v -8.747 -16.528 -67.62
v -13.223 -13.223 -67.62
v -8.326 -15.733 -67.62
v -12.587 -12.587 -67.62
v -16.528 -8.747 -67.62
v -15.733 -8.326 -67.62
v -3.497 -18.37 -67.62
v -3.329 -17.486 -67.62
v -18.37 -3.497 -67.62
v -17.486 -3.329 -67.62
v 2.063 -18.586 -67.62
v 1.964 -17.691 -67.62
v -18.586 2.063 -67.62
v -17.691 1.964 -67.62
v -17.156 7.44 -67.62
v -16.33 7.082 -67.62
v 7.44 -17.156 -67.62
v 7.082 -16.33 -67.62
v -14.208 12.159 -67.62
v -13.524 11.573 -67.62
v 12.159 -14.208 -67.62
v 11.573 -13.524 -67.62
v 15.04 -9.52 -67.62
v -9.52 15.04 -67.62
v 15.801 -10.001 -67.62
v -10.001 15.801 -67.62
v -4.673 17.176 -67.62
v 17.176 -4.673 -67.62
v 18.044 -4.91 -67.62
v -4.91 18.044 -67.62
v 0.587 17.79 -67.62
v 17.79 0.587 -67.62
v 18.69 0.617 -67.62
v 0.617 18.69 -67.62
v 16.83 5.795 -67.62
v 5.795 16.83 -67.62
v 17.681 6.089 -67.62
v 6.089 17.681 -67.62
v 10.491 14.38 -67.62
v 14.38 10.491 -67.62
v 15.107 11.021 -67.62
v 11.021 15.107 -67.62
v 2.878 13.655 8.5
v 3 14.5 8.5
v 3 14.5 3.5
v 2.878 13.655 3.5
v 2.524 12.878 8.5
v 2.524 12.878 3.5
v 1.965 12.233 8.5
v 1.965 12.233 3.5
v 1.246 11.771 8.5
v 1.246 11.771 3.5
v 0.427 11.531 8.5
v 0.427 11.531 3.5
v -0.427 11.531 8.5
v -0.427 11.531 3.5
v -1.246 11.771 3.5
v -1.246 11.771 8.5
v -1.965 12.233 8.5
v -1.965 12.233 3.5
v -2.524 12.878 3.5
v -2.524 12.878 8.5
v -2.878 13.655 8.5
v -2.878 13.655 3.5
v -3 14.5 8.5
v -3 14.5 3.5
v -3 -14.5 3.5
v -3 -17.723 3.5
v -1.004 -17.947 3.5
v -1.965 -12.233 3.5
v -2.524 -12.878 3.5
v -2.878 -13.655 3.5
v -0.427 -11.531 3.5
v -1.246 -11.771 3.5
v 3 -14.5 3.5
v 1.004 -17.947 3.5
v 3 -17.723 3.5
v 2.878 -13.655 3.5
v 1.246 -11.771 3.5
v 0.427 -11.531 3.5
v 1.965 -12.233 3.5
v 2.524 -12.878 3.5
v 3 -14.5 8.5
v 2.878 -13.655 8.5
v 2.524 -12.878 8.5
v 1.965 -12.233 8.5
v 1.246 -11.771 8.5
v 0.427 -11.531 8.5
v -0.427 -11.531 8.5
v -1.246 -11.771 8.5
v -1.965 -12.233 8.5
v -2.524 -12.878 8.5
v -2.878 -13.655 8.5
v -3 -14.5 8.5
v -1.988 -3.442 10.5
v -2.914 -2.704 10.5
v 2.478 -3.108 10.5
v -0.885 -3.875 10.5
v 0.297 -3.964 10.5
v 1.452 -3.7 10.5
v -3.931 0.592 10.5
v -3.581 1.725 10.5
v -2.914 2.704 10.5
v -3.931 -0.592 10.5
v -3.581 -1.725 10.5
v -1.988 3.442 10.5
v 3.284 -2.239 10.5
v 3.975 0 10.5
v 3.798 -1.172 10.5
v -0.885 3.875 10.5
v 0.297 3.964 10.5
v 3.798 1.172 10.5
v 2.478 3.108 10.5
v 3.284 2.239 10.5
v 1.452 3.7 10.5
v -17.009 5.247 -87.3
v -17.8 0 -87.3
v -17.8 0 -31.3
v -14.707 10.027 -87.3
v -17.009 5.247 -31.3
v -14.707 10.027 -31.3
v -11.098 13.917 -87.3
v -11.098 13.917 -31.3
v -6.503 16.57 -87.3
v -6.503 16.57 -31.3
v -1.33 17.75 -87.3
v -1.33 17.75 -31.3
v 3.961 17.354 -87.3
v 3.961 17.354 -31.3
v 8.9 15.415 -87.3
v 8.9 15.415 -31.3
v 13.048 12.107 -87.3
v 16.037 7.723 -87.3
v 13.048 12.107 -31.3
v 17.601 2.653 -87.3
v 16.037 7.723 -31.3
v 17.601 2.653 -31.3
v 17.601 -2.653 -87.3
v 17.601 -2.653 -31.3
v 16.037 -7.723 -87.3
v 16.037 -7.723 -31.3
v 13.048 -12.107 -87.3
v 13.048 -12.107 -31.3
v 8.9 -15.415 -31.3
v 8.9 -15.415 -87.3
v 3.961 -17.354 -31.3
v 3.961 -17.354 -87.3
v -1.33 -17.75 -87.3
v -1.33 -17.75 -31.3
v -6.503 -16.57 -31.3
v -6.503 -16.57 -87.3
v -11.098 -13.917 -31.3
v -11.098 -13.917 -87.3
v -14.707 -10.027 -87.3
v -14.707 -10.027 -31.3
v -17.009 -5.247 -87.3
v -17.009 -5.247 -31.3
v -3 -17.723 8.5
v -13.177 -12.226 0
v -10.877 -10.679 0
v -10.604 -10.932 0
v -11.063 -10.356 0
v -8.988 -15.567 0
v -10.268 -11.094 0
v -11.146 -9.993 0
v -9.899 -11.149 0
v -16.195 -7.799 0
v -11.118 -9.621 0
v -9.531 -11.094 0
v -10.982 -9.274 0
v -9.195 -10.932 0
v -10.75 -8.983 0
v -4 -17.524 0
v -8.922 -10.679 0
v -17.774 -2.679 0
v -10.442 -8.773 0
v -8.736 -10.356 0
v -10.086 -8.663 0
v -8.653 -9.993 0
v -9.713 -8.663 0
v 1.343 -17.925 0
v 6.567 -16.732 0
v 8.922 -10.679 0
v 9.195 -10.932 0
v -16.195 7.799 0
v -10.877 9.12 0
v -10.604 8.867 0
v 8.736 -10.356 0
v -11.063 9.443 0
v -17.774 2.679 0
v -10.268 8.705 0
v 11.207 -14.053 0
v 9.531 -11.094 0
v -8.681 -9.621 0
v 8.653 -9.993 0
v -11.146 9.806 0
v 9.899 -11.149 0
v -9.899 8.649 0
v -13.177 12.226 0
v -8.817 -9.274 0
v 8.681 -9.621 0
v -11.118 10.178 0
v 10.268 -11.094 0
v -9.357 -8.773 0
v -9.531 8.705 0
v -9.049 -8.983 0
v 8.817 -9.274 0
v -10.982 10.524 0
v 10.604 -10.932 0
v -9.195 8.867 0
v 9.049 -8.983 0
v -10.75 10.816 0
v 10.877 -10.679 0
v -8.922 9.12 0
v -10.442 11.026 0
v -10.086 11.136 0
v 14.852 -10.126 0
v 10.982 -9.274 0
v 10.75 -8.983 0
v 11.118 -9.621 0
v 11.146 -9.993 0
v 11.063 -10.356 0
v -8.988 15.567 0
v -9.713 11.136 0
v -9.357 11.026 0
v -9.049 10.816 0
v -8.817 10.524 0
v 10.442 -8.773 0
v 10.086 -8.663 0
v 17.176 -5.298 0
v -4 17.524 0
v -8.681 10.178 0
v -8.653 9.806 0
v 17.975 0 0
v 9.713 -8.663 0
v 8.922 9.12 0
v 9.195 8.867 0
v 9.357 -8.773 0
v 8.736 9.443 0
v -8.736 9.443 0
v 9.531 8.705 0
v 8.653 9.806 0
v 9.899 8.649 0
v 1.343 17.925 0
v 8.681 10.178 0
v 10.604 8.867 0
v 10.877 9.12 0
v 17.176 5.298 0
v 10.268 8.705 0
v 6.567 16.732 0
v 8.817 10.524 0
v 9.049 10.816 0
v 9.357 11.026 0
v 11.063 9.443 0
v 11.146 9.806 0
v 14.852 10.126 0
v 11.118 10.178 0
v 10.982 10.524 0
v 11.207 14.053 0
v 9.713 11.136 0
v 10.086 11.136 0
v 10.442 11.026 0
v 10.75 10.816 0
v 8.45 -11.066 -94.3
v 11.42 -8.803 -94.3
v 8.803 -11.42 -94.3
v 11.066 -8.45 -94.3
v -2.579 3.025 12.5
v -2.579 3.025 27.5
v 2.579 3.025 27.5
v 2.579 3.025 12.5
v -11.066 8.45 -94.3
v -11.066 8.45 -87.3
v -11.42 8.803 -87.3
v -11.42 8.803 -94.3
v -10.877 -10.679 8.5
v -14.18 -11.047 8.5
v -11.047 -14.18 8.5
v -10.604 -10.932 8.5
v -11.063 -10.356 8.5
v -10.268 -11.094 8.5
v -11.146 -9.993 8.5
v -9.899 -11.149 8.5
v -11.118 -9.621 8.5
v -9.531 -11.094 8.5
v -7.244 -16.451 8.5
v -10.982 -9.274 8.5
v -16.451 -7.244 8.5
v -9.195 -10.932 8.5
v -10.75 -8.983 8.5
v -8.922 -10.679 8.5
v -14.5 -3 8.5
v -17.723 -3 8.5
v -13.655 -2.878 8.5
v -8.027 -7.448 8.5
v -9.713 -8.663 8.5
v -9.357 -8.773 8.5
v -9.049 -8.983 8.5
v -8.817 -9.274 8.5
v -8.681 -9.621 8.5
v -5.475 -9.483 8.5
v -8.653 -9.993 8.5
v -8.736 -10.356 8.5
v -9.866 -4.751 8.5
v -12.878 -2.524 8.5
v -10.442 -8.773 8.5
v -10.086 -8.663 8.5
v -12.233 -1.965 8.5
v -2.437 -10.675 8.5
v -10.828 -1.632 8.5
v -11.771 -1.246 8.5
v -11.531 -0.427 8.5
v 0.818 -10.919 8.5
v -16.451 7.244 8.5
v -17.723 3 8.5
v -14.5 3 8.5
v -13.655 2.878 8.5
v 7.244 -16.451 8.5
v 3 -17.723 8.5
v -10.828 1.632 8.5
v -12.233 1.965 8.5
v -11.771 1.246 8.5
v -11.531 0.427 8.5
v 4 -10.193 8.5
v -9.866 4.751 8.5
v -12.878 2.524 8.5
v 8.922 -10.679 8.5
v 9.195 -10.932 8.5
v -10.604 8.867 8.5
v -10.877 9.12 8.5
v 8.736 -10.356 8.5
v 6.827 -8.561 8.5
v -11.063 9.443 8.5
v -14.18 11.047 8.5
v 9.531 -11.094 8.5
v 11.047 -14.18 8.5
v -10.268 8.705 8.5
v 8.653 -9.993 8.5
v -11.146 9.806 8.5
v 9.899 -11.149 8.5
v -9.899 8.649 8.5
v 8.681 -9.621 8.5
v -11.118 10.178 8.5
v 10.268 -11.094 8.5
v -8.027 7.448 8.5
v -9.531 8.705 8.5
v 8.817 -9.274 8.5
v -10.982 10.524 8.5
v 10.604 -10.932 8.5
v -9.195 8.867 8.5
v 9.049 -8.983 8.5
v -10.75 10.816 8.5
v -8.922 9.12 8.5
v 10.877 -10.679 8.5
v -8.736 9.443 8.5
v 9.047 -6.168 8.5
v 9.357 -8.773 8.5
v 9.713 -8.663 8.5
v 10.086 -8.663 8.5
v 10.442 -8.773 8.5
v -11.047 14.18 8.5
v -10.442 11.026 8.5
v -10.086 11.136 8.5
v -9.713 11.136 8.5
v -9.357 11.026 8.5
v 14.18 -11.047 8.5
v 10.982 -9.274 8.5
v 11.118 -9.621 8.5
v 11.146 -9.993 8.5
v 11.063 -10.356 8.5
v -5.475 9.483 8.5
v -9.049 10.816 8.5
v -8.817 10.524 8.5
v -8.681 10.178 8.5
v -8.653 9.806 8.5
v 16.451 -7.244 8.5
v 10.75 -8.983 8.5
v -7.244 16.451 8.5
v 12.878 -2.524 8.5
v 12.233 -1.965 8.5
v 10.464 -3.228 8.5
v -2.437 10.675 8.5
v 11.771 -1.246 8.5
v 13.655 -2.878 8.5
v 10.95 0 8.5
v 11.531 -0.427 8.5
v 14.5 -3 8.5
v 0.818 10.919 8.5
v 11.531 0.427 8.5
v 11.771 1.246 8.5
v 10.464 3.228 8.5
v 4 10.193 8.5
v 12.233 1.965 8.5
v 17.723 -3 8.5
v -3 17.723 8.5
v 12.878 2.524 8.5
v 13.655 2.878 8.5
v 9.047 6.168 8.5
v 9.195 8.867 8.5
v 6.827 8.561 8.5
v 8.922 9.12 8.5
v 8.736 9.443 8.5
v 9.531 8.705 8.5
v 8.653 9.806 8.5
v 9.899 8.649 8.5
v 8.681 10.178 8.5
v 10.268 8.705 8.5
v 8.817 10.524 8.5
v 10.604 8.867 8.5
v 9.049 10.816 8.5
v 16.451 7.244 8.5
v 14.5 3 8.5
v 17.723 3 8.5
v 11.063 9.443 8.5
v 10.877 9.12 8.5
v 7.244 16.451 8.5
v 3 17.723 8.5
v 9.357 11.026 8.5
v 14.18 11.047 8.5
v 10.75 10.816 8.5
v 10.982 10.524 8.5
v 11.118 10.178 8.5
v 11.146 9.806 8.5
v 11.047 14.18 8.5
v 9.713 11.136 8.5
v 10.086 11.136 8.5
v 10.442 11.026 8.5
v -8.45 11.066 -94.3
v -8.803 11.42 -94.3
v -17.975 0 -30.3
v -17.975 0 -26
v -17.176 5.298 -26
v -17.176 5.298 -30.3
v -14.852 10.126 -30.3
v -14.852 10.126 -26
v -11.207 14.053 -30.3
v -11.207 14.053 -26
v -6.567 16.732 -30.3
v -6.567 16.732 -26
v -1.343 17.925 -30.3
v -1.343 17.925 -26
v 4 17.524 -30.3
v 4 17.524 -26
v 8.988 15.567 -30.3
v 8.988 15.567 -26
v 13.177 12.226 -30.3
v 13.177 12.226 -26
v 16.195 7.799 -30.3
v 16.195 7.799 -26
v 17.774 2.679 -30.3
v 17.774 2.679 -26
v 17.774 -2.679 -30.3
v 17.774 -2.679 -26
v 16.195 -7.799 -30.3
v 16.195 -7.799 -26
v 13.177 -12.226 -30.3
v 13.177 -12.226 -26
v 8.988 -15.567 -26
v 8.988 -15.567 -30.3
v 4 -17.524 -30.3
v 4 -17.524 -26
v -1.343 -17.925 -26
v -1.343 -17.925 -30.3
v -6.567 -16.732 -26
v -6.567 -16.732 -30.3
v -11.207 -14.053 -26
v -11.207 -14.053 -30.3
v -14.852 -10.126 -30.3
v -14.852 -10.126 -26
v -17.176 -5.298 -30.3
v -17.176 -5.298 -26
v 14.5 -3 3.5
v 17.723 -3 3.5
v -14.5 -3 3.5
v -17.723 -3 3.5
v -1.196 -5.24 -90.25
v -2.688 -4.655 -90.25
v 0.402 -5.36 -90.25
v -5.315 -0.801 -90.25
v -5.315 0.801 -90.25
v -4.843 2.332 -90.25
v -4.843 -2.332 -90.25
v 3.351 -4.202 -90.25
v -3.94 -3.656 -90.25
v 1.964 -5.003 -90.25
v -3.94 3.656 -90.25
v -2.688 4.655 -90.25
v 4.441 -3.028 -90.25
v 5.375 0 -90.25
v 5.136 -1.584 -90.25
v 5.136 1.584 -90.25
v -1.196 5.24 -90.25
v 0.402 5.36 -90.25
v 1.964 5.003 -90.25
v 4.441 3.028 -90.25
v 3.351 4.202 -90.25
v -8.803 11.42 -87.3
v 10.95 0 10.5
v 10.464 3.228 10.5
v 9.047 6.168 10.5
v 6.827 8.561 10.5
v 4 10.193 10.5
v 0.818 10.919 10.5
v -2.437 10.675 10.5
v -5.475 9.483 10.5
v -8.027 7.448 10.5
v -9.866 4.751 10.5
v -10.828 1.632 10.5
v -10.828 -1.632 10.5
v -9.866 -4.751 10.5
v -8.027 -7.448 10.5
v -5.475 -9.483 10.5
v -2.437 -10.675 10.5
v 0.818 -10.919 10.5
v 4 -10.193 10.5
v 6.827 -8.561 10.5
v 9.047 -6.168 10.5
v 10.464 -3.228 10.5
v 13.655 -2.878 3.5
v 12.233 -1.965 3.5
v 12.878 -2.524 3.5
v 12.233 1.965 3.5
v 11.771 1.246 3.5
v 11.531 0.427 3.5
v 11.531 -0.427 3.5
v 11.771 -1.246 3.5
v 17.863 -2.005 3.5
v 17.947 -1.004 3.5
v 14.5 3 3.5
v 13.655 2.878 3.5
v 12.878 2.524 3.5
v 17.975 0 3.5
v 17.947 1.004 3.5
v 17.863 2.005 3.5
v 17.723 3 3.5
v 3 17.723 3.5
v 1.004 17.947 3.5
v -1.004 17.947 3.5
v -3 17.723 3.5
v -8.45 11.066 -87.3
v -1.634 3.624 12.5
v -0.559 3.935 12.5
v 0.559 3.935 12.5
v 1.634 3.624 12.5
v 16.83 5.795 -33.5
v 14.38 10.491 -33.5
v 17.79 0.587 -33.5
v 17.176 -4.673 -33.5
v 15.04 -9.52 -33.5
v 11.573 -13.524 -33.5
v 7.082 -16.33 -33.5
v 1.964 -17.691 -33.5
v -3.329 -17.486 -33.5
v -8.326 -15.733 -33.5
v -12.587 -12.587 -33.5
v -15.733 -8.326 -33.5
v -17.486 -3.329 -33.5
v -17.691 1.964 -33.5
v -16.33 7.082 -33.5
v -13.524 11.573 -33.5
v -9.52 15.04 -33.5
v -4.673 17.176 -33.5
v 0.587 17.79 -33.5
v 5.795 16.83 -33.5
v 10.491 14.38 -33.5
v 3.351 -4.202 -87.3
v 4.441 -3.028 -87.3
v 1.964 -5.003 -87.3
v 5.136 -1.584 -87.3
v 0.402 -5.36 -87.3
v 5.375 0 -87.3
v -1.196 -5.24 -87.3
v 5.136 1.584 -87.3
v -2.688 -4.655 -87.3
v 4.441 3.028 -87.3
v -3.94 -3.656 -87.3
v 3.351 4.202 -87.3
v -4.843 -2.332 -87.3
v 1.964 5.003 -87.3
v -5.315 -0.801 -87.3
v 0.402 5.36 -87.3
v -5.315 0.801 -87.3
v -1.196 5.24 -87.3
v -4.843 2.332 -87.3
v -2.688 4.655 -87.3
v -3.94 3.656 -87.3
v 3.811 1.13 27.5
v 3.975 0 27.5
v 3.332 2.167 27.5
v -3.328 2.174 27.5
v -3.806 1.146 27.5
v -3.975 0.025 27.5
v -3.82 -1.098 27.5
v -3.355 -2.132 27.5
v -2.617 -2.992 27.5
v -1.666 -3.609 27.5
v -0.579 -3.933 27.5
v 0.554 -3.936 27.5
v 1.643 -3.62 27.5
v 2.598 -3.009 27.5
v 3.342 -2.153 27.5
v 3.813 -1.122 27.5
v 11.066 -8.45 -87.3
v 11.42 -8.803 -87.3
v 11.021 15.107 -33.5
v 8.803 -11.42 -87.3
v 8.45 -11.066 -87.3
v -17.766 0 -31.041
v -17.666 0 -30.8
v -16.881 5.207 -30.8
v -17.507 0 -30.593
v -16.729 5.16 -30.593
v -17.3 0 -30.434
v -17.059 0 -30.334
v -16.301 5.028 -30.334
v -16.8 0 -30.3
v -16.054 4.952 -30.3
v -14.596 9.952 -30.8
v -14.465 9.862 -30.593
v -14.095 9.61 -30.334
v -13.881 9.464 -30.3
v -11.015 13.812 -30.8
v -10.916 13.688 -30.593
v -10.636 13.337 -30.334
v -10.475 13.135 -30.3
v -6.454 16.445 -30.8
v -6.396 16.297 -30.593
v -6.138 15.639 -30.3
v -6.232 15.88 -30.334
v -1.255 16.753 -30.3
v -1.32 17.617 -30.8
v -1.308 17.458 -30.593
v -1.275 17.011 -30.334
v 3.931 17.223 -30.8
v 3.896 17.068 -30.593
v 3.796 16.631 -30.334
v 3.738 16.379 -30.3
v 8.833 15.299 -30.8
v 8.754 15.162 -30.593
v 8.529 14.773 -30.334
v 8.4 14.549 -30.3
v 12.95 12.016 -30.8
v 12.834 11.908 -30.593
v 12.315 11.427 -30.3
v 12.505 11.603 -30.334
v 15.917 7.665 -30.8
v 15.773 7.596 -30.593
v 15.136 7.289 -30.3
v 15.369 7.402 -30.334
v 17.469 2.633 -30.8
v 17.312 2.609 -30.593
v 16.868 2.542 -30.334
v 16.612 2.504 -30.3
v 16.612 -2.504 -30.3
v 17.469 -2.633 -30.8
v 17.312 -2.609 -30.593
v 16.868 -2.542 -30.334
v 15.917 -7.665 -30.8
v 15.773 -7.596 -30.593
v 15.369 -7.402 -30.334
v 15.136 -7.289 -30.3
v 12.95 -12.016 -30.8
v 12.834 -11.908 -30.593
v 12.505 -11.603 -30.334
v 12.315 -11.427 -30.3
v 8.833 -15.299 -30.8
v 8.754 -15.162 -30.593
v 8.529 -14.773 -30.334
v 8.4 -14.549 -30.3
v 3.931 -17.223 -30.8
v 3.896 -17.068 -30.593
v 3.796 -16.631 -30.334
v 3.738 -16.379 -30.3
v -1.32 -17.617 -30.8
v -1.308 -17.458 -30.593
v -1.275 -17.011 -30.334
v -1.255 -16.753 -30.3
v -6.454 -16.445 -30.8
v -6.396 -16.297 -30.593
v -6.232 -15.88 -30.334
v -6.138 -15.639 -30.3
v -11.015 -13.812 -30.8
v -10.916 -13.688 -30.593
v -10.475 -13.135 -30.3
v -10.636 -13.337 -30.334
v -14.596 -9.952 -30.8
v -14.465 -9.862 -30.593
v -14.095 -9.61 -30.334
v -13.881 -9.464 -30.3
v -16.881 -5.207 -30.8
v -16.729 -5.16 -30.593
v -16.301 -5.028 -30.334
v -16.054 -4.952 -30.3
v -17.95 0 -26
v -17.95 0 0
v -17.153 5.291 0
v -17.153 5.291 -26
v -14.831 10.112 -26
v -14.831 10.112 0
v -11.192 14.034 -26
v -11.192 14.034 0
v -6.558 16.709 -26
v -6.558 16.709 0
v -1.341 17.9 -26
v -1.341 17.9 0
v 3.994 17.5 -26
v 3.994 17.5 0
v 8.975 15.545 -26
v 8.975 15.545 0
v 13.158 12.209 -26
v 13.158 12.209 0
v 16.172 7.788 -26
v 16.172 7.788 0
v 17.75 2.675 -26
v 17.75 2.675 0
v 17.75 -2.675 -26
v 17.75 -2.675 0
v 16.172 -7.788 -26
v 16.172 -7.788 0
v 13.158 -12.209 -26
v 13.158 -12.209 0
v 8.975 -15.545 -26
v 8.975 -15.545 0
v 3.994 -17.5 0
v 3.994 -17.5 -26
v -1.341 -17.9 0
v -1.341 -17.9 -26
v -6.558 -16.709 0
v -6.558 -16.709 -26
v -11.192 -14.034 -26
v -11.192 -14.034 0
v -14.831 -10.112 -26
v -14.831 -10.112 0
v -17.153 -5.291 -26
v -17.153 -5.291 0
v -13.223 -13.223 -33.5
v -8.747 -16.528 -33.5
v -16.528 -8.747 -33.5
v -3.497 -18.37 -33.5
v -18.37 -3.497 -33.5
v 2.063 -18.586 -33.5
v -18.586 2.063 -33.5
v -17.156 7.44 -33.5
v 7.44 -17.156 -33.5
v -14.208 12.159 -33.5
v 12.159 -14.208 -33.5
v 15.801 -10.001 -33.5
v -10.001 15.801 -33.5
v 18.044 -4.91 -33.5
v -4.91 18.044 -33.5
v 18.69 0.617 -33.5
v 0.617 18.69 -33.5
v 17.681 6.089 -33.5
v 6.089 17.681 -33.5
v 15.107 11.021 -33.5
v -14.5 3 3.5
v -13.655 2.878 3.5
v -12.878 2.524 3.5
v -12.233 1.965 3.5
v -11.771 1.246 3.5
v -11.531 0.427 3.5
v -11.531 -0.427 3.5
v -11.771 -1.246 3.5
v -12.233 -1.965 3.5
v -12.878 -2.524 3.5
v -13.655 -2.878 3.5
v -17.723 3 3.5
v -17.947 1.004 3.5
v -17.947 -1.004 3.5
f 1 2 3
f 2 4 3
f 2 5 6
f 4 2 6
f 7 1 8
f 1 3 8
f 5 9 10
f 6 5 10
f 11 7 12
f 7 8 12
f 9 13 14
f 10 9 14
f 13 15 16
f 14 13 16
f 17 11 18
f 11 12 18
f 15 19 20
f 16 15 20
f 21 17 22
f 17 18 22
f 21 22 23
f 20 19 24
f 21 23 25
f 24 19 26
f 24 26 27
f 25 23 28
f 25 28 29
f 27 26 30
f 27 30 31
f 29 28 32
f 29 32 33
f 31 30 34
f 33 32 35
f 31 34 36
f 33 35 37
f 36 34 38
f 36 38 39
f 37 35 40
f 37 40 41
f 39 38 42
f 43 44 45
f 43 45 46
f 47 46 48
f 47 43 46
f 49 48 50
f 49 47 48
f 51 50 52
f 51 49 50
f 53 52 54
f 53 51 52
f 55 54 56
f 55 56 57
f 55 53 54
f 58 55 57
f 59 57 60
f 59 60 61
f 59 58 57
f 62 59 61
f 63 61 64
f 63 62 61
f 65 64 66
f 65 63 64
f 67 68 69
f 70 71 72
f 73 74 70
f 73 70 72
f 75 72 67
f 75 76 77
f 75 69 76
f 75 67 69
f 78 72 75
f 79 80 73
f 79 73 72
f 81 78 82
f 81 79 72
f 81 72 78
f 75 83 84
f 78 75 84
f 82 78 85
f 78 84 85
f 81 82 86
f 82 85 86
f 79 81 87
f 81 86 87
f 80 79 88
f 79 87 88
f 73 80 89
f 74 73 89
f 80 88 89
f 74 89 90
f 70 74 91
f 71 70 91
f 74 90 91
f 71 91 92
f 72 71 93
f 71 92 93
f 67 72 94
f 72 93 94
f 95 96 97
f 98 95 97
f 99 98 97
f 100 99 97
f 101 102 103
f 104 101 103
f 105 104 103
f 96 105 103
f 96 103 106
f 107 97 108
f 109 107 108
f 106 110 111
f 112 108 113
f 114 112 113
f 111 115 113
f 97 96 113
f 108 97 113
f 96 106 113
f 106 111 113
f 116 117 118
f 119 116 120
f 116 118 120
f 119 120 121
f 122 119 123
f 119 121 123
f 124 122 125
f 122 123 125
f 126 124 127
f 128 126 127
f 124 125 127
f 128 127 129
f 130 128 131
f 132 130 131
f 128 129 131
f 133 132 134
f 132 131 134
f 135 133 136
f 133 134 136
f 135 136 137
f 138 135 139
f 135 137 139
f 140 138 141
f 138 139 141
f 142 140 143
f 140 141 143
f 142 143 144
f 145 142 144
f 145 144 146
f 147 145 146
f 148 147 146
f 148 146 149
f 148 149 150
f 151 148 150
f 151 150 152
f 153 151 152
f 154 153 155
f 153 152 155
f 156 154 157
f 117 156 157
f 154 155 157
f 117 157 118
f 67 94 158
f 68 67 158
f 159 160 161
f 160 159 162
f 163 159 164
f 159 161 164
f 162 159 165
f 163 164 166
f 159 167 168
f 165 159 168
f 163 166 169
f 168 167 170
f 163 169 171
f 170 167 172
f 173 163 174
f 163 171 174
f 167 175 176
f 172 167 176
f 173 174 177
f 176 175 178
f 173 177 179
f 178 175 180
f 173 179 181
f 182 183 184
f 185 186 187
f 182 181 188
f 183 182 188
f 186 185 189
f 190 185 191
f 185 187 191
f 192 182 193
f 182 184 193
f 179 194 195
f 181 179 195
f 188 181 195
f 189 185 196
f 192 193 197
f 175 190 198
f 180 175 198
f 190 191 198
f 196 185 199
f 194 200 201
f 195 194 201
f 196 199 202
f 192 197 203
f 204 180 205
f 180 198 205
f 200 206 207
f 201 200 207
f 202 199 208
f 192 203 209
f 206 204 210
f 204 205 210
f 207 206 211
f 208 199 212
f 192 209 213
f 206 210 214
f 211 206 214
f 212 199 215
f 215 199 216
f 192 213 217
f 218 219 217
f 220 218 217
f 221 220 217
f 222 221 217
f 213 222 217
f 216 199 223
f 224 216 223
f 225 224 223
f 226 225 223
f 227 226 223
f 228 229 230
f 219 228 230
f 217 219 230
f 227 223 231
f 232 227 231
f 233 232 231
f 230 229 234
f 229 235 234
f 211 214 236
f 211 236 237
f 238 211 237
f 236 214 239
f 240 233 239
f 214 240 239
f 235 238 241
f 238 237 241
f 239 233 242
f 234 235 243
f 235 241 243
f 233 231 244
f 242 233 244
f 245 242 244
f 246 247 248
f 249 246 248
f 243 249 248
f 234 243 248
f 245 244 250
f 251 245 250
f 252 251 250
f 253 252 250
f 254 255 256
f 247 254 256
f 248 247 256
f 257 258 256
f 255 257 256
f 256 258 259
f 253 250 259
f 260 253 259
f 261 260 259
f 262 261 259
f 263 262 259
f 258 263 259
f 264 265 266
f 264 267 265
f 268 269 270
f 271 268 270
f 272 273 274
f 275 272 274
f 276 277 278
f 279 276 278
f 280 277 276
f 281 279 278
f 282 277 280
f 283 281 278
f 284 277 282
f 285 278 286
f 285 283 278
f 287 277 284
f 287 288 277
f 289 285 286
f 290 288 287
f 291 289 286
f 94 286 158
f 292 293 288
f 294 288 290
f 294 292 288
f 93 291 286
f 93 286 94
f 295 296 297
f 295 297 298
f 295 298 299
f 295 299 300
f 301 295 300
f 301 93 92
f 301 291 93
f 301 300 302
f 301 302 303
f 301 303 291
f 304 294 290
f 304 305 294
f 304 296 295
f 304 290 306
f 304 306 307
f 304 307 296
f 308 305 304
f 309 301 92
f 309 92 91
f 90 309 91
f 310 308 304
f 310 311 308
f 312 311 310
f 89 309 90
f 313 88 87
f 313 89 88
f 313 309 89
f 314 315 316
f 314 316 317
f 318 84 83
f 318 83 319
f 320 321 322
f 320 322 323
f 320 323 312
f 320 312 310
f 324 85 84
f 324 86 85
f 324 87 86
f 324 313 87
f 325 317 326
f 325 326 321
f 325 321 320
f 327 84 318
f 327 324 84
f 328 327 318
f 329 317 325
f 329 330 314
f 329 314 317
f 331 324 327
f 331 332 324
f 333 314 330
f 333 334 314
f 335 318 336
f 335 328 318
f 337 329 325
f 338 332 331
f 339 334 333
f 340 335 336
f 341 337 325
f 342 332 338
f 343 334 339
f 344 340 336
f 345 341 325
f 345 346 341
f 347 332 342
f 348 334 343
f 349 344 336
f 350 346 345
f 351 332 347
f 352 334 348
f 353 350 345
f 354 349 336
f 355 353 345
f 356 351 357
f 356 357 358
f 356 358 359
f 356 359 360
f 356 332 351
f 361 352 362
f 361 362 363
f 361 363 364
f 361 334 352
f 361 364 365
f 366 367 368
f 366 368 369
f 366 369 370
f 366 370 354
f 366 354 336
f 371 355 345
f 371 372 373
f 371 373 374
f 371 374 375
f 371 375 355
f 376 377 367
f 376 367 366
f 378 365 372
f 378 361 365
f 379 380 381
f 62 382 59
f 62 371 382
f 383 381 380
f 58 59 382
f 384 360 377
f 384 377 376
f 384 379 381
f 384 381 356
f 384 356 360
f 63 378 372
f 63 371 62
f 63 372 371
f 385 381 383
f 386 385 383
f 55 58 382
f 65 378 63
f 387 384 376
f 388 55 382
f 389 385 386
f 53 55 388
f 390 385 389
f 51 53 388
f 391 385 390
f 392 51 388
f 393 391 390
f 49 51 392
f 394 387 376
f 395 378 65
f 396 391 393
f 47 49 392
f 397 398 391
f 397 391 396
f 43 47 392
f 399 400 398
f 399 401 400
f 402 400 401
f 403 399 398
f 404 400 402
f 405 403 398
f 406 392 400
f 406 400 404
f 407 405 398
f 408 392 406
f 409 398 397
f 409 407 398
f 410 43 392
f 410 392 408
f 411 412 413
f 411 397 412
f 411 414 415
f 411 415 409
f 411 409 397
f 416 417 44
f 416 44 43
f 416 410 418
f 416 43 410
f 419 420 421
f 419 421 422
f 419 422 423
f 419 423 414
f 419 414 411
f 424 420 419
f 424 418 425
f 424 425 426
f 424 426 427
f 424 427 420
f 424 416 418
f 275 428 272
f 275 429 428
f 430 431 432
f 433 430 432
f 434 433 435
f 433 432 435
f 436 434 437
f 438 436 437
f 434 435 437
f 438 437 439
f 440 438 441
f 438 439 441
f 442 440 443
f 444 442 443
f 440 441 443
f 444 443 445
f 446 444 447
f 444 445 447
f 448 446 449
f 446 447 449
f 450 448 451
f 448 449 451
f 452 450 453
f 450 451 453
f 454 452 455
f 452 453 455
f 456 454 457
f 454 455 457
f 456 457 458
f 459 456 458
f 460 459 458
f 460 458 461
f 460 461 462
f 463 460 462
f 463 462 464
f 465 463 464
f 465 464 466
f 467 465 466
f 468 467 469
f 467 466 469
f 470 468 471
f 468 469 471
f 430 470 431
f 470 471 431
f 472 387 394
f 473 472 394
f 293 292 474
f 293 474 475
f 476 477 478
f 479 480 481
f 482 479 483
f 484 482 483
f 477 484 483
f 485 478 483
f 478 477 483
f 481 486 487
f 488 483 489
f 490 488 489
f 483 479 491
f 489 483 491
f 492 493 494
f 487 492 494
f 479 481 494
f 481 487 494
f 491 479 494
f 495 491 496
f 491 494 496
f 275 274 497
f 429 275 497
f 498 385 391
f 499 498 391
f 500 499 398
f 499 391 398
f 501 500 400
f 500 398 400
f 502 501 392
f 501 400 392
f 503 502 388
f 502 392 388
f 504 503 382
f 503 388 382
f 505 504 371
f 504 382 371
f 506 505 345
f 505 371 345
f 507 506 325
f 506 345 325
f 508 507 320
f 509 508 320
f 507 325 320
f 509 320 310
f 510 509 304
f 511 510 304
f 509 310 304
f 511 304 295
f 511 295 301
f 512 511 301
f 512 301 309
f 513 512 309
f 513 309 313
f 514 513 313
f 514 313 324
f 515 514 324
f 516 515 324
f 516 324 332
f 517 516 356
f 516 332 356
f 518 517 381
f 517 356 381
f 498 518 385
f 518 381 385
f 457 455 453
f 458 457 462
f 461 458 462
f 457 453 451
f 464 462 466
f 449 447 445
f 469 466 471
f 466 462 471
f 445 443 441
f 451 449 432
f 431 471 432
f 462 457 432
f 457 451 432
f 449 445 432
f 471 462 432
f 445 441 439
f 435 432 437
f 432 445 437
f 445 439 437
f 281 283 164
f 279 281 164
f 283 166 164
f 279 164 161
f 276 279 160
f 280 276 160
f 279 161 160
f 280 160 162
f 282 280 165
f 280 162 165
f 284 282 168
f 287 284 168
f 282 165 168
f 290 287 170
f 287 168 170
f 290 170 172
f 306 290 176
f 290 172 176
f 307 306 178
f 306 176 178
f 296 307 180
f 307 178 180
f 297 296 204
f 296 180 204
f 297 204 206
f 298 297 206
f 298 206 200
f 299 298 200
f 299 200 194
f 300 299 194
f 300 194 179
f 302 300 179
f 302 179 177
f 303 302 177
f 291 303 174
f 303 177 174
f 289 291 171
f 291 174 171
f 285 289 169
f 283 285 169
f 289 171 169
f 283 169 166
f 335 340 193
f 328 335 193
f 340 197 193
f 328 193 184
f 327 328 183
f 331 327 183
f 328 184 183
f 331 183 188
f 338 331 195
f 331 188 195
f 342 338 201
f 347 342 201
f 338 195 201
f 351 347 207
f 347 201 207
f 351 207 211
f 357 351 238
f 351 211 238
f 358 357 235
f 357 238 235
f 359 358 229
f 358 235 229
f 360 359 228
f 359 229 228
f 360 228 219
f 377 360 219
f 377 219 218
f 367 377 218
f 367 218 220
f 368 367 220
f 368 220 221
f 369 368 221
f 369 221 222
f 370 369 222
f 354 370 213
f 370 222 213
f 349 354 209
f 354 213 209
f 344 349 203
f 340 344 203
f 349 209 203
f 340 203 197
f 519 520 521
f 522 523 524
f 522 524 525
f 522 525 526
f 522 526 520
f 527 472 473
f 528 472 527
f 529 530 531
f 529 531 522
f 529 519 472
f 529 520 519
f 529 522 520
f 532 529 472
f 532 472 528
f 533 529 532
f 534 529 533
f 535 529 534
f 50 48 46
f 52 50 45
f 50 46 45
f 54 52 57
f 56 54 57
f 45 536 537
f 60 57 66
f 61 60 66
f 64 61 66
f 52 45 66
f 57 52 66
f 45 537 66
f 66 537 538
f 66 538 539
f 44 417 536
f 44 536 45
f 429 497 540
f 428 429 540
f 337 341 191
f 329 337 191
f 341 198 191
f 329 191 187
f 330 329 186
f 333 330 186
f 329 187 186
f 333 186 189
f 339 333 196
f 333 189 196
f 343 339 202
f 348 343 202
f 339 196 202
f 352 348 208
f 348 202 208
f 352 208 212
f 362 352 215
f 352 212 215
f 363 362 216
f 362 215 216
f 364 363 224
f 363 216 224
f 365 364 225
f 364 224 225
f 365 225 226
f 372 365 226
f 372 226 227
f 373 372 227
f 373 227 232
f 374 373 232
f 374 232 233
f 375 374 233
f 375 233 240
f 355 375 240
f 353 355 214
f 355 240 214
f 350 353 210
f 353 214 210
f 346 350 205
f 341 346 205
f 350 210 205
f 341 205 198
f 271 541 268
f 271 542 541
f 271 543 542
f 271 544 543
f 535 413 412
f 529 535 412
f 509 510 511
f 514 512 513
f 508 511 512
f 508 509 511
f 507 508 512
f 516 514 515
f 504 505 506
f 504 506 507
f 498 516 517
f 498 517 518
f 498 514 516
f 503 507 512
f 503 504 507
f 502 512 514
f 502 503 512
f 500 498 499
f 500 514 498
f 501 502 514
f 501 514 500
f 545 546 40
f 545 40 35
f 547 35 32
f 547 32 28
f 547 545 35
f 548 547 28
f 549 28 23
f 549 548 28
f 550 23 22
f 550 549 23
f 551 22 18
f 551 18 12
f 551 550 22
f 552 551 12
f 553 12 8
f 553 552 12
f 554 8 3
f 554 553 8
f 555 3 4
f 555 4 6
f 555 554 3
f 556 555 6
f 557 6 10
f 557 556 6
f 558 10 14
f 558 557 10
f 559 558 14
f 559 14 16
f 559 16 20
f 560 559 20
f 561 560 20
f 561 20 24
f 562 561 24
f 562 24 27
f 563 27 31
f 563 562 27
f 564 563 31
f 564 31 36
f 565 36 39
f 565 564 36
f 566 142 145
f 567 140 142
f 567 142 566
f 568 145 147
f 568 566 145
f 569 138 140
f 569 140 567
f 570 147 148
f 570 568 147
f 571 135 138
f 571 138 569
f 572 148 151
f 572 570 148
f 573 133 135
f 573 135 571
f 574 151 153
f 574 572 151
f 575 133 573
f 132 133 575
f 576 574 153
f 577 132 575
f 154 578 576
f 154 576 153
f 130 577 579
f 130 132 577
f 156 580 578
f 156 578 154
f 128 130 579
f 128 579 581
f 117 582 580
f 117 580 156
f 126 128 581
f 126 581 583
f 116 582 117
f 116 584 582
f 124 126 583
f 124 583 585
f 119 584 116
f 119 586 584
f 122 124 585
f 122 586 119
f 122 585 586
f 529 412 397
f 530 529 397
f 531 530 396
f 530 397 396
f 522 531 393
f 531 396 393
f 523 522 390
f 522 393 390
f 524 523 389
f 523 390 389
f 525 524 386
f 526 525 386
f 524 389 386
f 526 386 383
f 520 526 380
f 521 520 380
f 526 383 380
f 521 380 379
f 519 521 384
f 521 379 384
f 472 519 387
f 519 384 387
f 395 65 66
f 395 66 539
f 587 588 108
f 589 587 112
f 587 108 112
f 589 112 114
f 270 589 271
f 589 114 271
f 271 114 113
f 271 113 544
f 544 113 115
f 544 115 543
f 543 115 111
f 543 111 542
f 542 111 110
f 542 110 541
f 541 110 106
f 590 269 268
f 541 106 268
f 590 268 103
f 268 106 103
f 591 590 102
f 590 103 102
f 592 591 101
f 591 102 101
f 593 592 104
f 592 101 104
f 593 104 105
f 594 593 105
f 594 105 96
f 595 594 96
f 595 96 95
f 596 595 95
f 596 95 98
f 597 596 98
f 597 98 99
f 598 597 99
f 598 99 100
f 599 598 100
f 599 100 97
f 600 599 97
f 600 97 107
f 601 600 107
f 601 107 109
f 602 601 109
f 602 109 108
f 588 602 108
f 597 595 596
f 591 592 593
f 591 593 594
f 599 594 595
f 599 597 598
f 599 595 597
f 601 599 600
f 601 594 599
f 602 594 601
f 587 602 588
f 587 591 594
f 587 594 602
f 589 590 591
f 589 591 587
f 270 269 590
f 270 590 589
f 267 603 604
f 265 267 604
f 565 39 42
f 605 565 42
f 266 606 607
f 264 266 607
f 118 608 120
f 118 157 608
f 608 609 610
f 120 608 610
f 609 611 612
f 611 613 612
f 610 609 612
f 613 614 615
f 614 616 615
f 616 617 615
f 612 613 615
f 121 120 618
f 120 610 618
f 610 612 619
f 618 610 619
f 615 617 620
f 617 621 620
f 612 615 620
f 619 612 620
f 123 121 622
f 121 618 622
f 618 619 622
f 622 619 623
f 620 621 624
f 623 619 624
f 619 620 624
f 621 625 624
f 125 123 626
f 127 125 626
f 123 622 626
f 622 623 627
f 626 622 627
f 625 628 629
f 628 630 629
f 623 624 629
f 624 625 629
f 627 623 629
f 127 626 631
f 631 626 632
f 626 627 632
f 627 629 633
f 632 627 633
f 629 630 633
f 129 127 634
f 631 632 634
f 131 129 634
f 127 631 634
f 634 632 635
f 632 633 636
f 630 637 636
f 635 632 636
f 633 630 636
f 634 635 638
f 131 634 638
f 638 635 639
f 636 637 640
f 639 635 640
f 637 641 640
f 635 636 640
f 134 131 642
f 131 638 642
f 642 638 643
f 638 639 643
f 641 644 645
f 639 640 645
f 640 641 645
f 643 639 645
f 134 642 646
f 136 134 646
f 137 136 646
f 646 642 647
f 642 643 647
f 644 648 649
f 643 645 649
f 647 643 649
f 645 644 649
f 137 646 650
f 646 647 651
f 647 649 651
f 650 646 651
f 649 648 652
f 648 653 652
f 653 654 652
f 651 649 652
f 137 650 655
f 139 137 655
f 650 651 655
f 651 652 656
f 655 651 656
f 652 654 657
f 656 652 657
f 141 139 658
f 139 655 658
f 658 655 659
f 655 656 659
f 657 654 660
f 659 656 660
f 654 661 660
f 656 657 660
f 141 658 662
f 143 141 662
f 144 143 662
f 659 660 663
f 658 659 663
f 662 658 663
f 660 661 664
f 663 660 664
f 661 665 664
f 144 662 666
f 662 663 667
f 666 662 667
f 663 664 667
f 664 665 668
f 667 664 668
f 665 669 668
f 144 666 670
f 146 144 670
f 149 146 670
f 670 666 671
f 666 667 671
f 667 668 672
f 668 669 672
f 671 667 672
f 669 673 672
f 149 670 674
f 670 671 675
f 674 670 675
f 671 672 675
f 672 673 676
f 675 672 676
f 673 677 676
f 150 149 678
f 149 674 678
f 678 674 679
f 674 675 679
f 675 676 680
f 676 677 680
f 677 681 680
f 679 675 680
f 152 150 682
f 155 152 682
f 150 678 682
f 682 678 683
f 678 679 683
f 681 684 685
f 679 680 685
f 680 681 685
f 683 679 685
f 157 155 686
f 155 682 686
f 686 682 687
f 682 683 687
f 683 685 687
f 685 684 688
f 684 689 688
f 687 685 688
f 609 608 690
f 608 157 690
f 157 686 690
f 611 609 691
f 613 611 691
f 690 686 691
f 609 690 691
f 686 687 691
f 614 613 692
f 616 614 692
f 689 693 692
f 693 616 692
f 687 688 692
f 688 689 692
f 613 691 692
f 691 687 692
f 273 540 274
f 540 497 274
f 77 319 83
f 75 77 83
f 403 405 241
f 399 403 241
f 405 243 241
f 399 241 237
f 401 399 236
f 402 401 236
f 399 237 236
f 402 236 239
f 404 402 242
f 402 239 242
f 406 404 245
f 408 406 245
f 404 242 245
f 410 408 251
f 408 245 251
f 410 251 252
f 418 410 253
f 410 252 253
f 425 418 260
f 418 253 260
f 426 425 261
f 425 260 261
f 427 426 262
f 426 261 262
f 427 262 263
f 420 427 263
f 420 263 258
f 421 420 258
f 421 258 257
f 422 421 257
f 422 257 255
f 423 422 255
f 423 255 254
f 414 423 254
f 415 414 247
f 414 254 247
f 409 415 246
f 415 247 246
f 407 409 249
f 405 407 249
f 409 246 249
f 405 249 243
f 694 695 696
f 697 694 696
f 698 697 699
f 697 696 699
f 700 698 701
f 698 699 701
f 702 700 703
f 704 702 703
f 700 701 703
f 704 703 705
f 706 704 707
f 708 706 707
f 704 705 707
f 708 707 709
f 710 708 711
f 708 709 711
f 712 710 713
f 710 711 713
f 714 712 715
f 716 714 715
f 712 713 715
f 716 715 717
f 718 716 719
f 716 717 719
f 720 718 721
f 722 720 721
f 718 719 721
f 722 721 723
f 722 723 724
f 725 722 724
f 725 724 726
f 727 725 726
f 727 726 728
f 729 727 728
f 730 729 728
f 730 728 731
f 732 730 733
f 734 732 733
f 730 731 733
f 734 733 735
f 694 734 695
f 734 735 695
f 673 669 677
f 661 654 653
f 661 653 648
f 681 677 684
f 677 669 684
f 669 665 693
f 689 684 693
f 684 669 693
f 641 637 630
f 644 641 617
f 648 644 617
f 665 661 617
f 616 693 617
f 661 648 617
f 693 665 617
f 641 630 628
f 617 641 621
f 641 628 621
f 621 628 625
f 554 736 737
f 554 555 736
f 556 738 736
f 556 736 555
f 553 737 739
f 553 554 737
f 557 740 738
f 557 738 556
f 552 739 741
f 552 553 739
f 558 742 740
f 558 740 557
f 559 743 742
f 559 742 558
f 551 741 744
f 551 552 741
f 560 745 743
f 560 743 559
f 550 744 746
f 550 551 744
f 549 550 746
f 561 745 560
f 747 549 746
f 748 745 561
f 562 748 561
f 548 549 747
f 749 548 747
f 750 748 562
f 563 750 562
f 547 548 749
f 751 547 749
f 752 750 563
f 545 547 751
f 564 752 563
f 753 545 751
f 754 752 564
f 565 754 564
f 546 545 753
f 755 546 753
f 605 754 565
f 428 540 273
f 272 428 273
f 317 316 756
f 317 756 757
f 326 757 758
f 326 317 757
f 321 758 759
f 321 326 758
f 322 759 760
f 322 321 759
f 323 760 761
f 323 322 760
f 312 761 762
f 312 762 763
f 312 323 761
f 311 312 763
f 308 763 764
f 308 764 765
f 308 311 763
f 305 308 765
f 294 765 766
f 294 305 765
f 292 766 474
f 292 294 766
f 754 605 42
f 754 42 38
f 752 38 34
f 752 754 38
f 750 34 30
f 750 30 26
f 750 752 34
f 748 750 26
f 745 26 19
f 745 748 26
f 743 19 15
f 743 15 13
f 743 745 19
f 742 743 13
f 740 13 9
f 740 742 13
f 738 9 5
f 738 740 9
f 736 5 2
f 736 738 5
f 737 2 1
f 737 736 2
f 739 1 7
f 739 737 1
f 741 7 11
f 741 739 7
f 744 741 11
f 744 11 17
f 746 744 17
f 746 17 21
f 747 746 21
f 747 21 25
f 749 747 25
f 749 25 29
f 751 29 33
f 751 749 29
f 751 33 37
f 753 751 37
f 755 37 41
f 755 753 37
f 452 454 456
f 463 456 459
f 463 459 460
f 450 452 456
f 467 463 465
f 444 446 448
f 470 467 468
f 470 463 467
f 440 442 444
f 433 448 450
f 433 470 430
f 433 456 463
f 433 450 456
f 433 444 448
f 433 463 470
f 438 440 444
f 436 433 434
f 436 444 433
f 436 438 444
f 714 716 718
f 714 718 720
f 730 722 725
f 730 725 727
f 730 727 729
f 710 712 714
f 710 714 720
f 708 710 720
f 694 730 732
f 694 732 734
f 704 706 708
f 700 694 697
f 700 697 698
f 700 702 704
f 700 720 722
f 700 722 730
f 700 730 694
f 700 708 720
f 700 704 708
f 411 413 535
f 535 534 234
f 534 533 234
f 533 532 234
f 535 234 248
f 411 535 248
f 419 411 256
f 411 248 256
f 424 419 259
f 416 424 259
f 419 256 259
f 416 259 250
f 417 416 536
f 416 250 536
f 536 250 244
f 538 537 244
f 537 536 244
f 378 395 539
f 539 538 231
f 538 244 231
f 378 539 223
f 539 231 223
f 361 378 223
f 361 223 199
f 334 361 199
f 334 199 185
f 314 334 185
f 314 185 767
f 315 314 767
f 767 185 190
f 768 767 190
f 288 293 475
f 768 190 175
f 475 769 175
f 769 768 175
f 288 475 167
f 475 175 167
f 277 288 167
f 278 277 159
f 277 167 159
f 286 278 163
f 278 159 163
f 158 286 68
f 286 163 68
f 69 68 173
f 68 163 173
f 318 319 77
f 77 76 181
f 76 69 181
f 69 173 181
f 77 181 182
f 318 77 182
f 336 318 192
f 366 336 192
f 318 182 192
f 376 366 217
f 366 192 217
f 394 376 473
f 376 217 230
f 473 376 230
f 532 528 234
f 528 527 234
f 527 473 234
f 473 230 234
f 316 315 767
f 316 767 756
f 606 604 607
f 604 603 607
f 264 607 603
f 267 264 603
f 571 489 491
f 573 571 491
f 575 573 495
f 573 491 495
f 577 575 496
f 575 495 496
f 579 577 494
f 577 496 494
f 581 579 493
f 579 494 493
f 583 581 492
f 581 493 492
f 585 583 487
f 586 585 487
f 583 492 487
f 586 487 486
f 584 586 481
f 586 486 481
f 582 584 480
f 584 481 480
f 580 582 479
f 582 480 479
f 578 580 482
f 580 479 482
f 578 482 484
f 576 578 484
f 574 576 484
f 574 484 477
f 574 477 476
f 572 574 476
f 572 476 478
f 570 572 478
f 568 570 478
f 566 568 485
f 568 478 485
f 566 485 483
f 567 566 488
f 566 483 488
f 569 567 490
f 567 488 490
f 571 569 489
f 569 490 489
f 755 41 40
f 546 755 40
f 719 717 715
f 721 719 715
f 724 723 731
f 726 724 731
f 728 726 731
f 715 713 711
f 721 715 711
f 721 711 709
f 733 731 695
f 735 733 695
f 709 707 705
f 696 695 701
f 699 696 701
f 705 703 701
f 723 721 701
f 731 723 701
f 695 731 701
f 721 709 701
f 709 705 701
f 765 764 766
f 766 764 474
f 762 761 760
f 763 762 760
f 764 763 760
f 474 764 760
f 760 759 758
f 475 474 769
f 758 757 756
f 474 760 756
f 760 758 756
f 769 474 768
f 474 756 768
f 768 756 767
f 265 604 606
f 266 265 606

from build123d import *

# Parameters (mm, degrees)
SKETCH1_R                      = 17.975
BOSS_EXTRUDE1_DEPTH            = 8.5
CUT_EXTRUDE1_DEPTH             = 5
SKETCH3_R                      = 10.95
BOSS_EXTRUDE2_DEPTH            = 2
SKETCH4_R                      = 3.975
BOSS_EXTRUDE3_DEPTH            = 17
SKETCH5_W                      = 5.157518784
SKETCH5_H                      = 0.95
CUT_EXTRUDE2_DEPTH             = 15
SKETCH7_W                      = 1.25
SKETCH7_H                      = 8.5
M3X0_5_TAPPED_HOLE1_AT_2_COUNT = 2
M3X0_5_TAPPED_HOLE1_AT_2_PITCH = 19.798989873
M3X0_5_TAPPED_HOLE1_AT_3_COUNT = 2
M3X0_5_TAPPED_HOLE1_AT_3_PITCH = 28
M3X0_5_TAPPED_HOLE1_AT_4_COUNT = 2
M3X0_5_TAPPED_HOLE1_AT_4_PITCH = 19.798989873
SKETCH8_R                      = 17.95
BOSS_EXTRUDE4_DEPTH            = 26
SKETCH9_R                      = 17.975
BOSS_EXTRUDE5_DEPTH            = 4.3
SKETCH10_R                     = 17.8
BOSS_EXTRUDE6_DEPTH            = 57
FILLET1_R                      = 1
SKETCH11_R                     = 5.375
BOSS_EXTRUDE7_DEPTH            = 2.95
BOSS_EXTRUDE8_DEPTH            = 7
BOSS_EXTRUDE8_2_DEPTH          = 7
BOSS_EXTRUDE9_DEPTH            = 34.12


with BuildPart() as part:
    # Sketch1 → Boss-Extrude1 (new body)
    with BuildSketch(Plane.XY):
        Circle(SKETCH1_R)
    extrude(amount=BOSS_EXTRUDE1_DEPTH)

    # Sketch2 → Cut-Extrude1 (cut)
    with BuildSketch(Plane.XY.offset(8.5)):
        with BuildLine():
            Line((-14.5, -3), (-24.5, -3))
            ThreePointArc((-24.5, -3), (-27.5, 0), (-24.5, 3))
            Line((-24.5, 3), (-14.5, 3))
            ThreePointArc((-14.5, 3), (-11.5, 0), (-14.5, -3))
        make_face()
        with BuildLine():
            Line((14.5, -3), (24.5, -3))
            ThreePointArc((24.5, -3), (27.5, 0), (24.5, 3))
            Line((24.5, 3), (14.5, 3))
            ThreePointArc((14.5, 3), (11.5, 0), (14.5, -3))
        make_face()
        with BuildLine():
            Line((-3, 14.5), (-3, 24.5))
            ThreePointArc((-3, 24.5), (0, 27.5), (3, 24.5))
            Line((3, 24.5), (3, 14.5))
            ThreePointArc((3, 14.5), (0, 11.5), (-3, 14.5))
        make_face()
        with BuildLine():
            Line((-3, -14.5), (-3, -24.5))
            ThreePointArc((-3, -24.5), (0, -27.5), (3, -24.5))
            Line((3, -24.5), (3, -14.5))
            ThreePointArc((3, -14.5), (0, -11.5), (-3, -14.5))
        make_face()
    extrude(amount=-CUT_EXTRUDE1_DEPTH, mode=Mode.SUBTRACT)

    # Sketch3 → Boss-Extrude2 (add)
    with BuildSketch(Plane.XY.offset(8.5)):
        Circle(SKETCH3_R)
    extrude(amount=BOSS_EXTRUDE2_DEPTH)

    # Sketch7 → M3x0.5 Tapped Hole1 (revolve, cut)
    with BuildSketch(Plane(origin=(-9.899494937, 9.899494937, 8.5), x_dir=(0, -1, 0), z_dir=(1, 0, 0))):
        with Locations((0.625, 4.25)):
            Rectangle(SKETCH7_W, SKETCH7_H)
    m3x0_5_tapped_hole1 = revolve(axis=Axis((-9.899494937, 9.899494937, 14.85), (0, 0, -1)), mode=Mode.SUBTRACT)

    # M3x0.5 Tapped Hole1 at 2: M3x0.5 Tapped Hole1 ×2
    with Locations(*[(0, -i * M3X0_5_TAPPED_HOLE1_AT_2_PITCH, 0) for i in range(1, M3X0_5_TAPPED_HOLE1_AT_2_COUNT)]):
        add(m3x0_5_tapped_hole1, mode=Mode.SUBTRACT)

    # M3x0.5 Tapped Hole1 at 3: M3x0.5 Tapped Hole1 ×2
    with Locations(*[Vector(0.707106781, -0.707106781, 0) * (i * M3X0_5_TAPPED_HOLE1_AT_3_PITCH) for i in range(1, M3X0_5_TAPPED_HOLE1_AT_3_COUNT)]):
        add(m3x0_5_tapped_hole1, mode=Mode.SUBTRACT)

    # M3x0.5 Tapped Hole1 at 4: M3x0.5 Tapped Hole1 ×2
    with Locations(*[(i * M3X0_5_TAPPED_HOLE1_AT_4_PITCH, 0, 0) for i in range(1, M3X0_5_TAPPED_HOLE1_AT_4_COUNT)]):
        add(m3x0_5_tapped_hole1, mode=Mode.SUBTRACT)


with BuildPart() as body_2:
    # Sketch4 → Boss-Extrude3 (new body)
    with BuildSketch(Plane.XY.offset(10.5)):
        Circle(SKETCH4_R)
    extrude(amount=BOSS_EXTRUDE3_DEPTH)

    # Sketch5 → Cut-Extrude2 (cut)
    with BuildSketch(Plane.XY.offset(27.5)):
        with Locations((0, 3.5)):
            Rectangle(SKETCH5_W, SKETCH5_H)
    extrude(amount=-CUT_EXTRUDE2_DEPTH, mode=Mode.SUBTRACT)


with BuildPart() as body_3:
    # Sketch8 → Boss-Extrude4 (new body)
    with BuildSketch(Plane(origin=(0, 0, 0), x_dir=(-1, 0, 0), z_dir=(0, 0, -1))):
        Circle(SKETCH8_R)
    extrude(amount=BOSS_EXTRUDE4_DEPTH)


with BuildPart() as body_4:
    # Sketch9 → Boss-Extrude5 (new body)
    with BuildSketch(Plane(origin=(0, 0, -26), x_dir=(-1, 0, 0), z_dir=(0, 0, -1))):
        Circle(SKETCH9_R)
    extrude(amount=BOSS_EXTRUDE5_DEPTH)


with BuildPart() as body_5:
    # Sketch10 → Boss-Extrude6 (new body)
    with BuildSketch(Plane(origin=(0, 0, -30.3), x_dir=(-1, 0, 0), z_dir=(0, 0, -1))):
        Circle(SKETCH10_R)
    extrude(amount=BOSS_EXTRUDE6_DEPTH)

    # Fillet1
    fillet1_edges = [body_5.edges().sort_by_distance(p)[0] for p in [
        (17.8, 0, -30.3),
    ]]
    fillet(fillet1_edges, radius=FILLET1_R)

    # Sketch11 → Boss-Extrude7 (add)
    with BuildSketch(Plane.XY.offset(-90.25)):
        Circle(SKETCH11_R)
    extrude(amount=BOSS_EXTRUDE7_DEPTH)


with BuildPart() as body_6:
    # Sketch12 → Boss-Extrude8 (new body)
    with BuildSketch(Plane(origin=(0, 0, -87.3), x_dir=(-1, 0, 0), z_dir=(0, 0, -1))):
        Polygon((8.449926035, 11.066221126), (11.066221126, 8.449926035), (11.419774516, 8.803479426), (8.803479426, 11.419774516), align=None)
    extrude(amount=BOSS_EXTRUDE8_DEPTH)


with BuildPart() as body_7:
    # Sketch12 → Boss-Extrude8 2 (new body)
    with BuildSketch(Plane(origin=(0, 0, -87.3), x_dir=(-1, 0, 0), z_dir=(0, 0, -1))):
        Polygon((-11.419774516, -8.803479426), (-8.803479426, -11.419774516), (-8.449926035, -11.066221126), (-11.066221126, -8.449926035), align=None)
    extrude(amount=BOSS_EXTRUDE8_2_DEPTH)


with BuildPart() as body_8:
    # Sketch13 → Boss-Extrude9 (new body)
    with BuildSketch(Plane.XY.offset(-33.5)):
        with BuildLine():
            Line((10.490839337, 14.379926634), (11.021275034, 15.107001576))
            ThreePointArc((11.021275034, 15.107001576), (-13.222896808, -13.222896808), (15.107001576, 11.021275034))
            Line((15.107001576, 11.021275034), (14.379926634, 10.490839337))
            ThreePointArc((14.379926634, 10.490839337), (-12.586500705, -12.586500705), (10.490839337, 14.379926634))
        make_face()
    extrude(amount=-BOSS_EXTRUDE9_DEPTH)


solid = Compound([part.part, body_2.part, body_3.part, body_4.part, body_5.part, body_6.part, body_7.part, body_8.part])
